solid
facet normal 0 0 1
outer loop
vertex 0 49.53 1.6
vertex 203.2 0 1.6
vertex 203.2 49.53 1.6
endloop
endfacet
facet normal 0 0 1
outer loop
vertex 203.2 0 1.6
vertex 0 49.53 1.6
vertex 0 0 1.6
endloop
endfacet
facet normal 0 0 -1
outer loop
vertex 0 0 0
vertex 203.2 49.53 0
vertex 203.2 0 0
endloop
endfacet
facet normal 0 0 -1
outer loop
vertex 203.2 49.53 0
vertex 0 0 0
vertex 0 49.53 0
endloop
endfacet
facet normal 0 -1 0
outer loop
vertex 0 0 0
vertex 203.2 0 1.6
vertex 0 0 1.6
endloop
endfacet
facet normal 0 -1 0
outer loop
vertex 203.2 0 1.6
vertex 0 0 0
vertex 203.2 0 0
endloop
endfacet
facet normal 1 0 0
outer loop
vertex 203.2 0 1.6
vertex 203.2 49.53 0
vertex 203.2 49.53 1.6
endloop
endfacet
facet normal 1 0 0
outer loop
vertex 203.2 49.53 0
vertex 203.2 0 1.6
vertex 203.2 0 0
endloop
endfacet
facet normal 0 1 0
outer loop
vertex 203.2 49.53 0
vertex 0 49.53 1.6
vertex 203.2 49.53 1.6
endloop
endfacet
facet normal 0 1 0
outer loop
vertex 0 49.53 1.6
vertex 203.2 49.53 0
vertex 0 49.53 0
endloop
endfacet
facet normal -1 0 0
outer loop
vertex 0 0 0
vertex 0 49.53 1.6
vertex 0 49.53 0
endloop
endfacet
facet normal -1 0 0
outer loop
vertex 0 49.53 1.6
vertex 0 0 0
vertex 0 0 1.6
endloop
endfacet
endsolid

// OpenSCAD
$fn = 64;

board_length = 203.2;
board_width  = 49.53;
board_thick  = 1.6;

color([0.05, 0.45, 0.12])
cube([board_length, board_width, board_thick], center=false);
